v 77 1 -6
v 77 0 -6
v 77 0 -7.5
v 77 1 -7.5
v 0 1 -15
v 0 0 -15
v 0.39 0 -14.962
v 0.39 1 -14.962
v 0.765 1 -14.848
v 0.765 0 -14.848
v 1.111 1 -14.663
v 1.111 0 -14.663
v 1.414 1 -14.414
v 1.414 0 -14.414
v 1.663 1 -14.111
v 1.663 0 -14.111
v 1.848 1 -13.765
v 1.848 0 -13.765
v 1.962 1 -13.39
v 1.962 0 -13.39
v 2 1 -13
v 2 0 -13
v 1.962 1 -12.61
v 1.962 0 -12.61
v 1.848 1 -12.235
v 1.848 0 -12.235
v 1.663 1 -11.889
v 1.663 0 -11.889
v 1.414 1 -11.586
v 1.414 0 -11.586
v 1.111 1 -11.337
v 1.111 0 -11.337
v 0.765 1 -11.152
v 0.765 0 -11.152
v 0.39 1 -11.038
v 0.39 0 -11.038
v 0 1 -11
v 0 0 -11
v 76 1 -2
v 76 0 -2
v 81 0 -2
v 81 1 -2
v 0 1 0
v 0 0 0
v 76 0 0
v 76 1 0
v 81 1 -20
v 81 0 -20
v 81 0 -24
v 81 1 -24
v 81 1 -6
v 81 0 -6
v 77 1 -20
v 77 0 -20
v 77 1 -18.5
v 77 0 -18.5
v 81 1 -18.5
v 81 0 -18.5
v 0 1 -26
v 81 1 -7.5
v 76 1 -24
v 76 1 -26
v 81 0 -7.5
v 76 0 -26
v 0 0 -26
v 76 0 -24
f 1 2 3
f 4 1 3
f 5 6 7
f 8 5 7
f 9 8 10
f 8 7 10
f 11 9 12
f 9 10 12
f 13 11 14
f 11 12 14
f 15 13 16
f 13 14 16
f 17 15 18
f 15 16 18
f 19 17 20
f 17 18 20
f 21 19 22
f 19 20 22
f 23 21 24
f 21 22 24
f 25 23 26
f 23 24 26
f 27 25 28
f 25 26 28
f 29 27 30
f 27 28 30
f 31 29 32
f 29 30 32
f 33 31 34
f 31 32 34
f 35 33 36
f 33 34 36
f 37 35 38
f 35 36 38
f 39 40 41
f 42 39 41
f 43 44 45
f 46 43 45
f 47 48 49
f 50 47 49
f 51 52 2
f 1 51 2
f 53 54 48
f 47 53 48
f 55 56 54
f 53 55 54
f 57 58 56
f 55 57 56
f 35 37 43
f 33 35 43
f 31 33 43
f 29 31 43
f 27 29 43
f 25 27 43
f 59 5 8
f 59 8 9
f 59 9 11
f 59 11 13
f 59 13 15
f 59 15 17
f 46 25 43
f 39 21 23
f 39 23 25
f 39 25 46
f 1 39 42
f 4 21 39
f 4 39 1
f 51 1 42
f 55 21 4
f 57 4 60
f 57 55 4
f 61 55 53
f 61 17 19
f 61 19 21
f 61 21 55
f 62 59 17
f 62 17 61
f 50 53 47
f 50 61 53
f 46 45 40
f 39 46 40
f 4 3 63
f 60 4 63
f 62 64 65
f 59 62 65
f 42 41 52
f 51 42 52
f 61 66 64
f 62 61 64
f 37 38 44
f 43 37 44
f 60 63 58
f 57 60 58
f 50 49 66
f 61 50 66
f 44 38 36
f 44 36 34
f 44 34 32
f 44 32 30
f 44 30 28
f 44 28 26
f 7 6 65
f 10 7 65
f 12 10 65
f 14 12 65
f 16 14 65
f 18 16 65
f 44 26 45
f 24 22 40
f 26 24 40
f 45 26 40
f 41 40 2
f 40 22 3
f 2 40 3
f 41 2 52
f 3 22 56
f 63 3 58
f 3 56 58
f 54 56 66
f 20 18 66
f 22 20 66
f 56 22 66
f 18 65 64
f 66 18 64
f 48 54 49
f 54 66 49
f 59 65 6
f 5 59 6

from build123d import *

# Parameters (mm, degrees)
EXTRUDE_1_DEPTH = 1


with BuildPart() as part:
    # 草圖1 → 填料-伸長1 (new body)
    with BuildSketch(Plane(origin=(0, 0, 0), x_dir=(1, 0, 0), z_dir=(0, 1, 0))):
        with BuildLine():
            Line((0, 0), (76, 0))
            Line((76, 0), (76, 2))
            Line((76, 2), (81, 2))
            Line((81, 2), (81, 6))
            Line((81, 6), (77, 6))
            Line((77, 6), (77, 7.5))
            Line((77, 7.5), (81, 7.5))
            Line((81, 7.5), (81, 18.5))
            Line((81, 18.5), (77, 18.5))
            Line((77, 18.5), (77, 20))
            Line((77, 20), (81, 20))
            Line((81, 20), (81, 24))
            Line((81, 24), (76, 24))
            Line((76, 24), (76, 26))
            Line((76, 26), (0, 26))
            Line((0, 26), (0, 15))
            ThreePointArc((0, 15), (2, 13), (0, 11))
            Line((0, 11), (0, 0))
        make_face()
    extrude(amount=EXTRUDE_1_DEPTH)


solid = part.part
